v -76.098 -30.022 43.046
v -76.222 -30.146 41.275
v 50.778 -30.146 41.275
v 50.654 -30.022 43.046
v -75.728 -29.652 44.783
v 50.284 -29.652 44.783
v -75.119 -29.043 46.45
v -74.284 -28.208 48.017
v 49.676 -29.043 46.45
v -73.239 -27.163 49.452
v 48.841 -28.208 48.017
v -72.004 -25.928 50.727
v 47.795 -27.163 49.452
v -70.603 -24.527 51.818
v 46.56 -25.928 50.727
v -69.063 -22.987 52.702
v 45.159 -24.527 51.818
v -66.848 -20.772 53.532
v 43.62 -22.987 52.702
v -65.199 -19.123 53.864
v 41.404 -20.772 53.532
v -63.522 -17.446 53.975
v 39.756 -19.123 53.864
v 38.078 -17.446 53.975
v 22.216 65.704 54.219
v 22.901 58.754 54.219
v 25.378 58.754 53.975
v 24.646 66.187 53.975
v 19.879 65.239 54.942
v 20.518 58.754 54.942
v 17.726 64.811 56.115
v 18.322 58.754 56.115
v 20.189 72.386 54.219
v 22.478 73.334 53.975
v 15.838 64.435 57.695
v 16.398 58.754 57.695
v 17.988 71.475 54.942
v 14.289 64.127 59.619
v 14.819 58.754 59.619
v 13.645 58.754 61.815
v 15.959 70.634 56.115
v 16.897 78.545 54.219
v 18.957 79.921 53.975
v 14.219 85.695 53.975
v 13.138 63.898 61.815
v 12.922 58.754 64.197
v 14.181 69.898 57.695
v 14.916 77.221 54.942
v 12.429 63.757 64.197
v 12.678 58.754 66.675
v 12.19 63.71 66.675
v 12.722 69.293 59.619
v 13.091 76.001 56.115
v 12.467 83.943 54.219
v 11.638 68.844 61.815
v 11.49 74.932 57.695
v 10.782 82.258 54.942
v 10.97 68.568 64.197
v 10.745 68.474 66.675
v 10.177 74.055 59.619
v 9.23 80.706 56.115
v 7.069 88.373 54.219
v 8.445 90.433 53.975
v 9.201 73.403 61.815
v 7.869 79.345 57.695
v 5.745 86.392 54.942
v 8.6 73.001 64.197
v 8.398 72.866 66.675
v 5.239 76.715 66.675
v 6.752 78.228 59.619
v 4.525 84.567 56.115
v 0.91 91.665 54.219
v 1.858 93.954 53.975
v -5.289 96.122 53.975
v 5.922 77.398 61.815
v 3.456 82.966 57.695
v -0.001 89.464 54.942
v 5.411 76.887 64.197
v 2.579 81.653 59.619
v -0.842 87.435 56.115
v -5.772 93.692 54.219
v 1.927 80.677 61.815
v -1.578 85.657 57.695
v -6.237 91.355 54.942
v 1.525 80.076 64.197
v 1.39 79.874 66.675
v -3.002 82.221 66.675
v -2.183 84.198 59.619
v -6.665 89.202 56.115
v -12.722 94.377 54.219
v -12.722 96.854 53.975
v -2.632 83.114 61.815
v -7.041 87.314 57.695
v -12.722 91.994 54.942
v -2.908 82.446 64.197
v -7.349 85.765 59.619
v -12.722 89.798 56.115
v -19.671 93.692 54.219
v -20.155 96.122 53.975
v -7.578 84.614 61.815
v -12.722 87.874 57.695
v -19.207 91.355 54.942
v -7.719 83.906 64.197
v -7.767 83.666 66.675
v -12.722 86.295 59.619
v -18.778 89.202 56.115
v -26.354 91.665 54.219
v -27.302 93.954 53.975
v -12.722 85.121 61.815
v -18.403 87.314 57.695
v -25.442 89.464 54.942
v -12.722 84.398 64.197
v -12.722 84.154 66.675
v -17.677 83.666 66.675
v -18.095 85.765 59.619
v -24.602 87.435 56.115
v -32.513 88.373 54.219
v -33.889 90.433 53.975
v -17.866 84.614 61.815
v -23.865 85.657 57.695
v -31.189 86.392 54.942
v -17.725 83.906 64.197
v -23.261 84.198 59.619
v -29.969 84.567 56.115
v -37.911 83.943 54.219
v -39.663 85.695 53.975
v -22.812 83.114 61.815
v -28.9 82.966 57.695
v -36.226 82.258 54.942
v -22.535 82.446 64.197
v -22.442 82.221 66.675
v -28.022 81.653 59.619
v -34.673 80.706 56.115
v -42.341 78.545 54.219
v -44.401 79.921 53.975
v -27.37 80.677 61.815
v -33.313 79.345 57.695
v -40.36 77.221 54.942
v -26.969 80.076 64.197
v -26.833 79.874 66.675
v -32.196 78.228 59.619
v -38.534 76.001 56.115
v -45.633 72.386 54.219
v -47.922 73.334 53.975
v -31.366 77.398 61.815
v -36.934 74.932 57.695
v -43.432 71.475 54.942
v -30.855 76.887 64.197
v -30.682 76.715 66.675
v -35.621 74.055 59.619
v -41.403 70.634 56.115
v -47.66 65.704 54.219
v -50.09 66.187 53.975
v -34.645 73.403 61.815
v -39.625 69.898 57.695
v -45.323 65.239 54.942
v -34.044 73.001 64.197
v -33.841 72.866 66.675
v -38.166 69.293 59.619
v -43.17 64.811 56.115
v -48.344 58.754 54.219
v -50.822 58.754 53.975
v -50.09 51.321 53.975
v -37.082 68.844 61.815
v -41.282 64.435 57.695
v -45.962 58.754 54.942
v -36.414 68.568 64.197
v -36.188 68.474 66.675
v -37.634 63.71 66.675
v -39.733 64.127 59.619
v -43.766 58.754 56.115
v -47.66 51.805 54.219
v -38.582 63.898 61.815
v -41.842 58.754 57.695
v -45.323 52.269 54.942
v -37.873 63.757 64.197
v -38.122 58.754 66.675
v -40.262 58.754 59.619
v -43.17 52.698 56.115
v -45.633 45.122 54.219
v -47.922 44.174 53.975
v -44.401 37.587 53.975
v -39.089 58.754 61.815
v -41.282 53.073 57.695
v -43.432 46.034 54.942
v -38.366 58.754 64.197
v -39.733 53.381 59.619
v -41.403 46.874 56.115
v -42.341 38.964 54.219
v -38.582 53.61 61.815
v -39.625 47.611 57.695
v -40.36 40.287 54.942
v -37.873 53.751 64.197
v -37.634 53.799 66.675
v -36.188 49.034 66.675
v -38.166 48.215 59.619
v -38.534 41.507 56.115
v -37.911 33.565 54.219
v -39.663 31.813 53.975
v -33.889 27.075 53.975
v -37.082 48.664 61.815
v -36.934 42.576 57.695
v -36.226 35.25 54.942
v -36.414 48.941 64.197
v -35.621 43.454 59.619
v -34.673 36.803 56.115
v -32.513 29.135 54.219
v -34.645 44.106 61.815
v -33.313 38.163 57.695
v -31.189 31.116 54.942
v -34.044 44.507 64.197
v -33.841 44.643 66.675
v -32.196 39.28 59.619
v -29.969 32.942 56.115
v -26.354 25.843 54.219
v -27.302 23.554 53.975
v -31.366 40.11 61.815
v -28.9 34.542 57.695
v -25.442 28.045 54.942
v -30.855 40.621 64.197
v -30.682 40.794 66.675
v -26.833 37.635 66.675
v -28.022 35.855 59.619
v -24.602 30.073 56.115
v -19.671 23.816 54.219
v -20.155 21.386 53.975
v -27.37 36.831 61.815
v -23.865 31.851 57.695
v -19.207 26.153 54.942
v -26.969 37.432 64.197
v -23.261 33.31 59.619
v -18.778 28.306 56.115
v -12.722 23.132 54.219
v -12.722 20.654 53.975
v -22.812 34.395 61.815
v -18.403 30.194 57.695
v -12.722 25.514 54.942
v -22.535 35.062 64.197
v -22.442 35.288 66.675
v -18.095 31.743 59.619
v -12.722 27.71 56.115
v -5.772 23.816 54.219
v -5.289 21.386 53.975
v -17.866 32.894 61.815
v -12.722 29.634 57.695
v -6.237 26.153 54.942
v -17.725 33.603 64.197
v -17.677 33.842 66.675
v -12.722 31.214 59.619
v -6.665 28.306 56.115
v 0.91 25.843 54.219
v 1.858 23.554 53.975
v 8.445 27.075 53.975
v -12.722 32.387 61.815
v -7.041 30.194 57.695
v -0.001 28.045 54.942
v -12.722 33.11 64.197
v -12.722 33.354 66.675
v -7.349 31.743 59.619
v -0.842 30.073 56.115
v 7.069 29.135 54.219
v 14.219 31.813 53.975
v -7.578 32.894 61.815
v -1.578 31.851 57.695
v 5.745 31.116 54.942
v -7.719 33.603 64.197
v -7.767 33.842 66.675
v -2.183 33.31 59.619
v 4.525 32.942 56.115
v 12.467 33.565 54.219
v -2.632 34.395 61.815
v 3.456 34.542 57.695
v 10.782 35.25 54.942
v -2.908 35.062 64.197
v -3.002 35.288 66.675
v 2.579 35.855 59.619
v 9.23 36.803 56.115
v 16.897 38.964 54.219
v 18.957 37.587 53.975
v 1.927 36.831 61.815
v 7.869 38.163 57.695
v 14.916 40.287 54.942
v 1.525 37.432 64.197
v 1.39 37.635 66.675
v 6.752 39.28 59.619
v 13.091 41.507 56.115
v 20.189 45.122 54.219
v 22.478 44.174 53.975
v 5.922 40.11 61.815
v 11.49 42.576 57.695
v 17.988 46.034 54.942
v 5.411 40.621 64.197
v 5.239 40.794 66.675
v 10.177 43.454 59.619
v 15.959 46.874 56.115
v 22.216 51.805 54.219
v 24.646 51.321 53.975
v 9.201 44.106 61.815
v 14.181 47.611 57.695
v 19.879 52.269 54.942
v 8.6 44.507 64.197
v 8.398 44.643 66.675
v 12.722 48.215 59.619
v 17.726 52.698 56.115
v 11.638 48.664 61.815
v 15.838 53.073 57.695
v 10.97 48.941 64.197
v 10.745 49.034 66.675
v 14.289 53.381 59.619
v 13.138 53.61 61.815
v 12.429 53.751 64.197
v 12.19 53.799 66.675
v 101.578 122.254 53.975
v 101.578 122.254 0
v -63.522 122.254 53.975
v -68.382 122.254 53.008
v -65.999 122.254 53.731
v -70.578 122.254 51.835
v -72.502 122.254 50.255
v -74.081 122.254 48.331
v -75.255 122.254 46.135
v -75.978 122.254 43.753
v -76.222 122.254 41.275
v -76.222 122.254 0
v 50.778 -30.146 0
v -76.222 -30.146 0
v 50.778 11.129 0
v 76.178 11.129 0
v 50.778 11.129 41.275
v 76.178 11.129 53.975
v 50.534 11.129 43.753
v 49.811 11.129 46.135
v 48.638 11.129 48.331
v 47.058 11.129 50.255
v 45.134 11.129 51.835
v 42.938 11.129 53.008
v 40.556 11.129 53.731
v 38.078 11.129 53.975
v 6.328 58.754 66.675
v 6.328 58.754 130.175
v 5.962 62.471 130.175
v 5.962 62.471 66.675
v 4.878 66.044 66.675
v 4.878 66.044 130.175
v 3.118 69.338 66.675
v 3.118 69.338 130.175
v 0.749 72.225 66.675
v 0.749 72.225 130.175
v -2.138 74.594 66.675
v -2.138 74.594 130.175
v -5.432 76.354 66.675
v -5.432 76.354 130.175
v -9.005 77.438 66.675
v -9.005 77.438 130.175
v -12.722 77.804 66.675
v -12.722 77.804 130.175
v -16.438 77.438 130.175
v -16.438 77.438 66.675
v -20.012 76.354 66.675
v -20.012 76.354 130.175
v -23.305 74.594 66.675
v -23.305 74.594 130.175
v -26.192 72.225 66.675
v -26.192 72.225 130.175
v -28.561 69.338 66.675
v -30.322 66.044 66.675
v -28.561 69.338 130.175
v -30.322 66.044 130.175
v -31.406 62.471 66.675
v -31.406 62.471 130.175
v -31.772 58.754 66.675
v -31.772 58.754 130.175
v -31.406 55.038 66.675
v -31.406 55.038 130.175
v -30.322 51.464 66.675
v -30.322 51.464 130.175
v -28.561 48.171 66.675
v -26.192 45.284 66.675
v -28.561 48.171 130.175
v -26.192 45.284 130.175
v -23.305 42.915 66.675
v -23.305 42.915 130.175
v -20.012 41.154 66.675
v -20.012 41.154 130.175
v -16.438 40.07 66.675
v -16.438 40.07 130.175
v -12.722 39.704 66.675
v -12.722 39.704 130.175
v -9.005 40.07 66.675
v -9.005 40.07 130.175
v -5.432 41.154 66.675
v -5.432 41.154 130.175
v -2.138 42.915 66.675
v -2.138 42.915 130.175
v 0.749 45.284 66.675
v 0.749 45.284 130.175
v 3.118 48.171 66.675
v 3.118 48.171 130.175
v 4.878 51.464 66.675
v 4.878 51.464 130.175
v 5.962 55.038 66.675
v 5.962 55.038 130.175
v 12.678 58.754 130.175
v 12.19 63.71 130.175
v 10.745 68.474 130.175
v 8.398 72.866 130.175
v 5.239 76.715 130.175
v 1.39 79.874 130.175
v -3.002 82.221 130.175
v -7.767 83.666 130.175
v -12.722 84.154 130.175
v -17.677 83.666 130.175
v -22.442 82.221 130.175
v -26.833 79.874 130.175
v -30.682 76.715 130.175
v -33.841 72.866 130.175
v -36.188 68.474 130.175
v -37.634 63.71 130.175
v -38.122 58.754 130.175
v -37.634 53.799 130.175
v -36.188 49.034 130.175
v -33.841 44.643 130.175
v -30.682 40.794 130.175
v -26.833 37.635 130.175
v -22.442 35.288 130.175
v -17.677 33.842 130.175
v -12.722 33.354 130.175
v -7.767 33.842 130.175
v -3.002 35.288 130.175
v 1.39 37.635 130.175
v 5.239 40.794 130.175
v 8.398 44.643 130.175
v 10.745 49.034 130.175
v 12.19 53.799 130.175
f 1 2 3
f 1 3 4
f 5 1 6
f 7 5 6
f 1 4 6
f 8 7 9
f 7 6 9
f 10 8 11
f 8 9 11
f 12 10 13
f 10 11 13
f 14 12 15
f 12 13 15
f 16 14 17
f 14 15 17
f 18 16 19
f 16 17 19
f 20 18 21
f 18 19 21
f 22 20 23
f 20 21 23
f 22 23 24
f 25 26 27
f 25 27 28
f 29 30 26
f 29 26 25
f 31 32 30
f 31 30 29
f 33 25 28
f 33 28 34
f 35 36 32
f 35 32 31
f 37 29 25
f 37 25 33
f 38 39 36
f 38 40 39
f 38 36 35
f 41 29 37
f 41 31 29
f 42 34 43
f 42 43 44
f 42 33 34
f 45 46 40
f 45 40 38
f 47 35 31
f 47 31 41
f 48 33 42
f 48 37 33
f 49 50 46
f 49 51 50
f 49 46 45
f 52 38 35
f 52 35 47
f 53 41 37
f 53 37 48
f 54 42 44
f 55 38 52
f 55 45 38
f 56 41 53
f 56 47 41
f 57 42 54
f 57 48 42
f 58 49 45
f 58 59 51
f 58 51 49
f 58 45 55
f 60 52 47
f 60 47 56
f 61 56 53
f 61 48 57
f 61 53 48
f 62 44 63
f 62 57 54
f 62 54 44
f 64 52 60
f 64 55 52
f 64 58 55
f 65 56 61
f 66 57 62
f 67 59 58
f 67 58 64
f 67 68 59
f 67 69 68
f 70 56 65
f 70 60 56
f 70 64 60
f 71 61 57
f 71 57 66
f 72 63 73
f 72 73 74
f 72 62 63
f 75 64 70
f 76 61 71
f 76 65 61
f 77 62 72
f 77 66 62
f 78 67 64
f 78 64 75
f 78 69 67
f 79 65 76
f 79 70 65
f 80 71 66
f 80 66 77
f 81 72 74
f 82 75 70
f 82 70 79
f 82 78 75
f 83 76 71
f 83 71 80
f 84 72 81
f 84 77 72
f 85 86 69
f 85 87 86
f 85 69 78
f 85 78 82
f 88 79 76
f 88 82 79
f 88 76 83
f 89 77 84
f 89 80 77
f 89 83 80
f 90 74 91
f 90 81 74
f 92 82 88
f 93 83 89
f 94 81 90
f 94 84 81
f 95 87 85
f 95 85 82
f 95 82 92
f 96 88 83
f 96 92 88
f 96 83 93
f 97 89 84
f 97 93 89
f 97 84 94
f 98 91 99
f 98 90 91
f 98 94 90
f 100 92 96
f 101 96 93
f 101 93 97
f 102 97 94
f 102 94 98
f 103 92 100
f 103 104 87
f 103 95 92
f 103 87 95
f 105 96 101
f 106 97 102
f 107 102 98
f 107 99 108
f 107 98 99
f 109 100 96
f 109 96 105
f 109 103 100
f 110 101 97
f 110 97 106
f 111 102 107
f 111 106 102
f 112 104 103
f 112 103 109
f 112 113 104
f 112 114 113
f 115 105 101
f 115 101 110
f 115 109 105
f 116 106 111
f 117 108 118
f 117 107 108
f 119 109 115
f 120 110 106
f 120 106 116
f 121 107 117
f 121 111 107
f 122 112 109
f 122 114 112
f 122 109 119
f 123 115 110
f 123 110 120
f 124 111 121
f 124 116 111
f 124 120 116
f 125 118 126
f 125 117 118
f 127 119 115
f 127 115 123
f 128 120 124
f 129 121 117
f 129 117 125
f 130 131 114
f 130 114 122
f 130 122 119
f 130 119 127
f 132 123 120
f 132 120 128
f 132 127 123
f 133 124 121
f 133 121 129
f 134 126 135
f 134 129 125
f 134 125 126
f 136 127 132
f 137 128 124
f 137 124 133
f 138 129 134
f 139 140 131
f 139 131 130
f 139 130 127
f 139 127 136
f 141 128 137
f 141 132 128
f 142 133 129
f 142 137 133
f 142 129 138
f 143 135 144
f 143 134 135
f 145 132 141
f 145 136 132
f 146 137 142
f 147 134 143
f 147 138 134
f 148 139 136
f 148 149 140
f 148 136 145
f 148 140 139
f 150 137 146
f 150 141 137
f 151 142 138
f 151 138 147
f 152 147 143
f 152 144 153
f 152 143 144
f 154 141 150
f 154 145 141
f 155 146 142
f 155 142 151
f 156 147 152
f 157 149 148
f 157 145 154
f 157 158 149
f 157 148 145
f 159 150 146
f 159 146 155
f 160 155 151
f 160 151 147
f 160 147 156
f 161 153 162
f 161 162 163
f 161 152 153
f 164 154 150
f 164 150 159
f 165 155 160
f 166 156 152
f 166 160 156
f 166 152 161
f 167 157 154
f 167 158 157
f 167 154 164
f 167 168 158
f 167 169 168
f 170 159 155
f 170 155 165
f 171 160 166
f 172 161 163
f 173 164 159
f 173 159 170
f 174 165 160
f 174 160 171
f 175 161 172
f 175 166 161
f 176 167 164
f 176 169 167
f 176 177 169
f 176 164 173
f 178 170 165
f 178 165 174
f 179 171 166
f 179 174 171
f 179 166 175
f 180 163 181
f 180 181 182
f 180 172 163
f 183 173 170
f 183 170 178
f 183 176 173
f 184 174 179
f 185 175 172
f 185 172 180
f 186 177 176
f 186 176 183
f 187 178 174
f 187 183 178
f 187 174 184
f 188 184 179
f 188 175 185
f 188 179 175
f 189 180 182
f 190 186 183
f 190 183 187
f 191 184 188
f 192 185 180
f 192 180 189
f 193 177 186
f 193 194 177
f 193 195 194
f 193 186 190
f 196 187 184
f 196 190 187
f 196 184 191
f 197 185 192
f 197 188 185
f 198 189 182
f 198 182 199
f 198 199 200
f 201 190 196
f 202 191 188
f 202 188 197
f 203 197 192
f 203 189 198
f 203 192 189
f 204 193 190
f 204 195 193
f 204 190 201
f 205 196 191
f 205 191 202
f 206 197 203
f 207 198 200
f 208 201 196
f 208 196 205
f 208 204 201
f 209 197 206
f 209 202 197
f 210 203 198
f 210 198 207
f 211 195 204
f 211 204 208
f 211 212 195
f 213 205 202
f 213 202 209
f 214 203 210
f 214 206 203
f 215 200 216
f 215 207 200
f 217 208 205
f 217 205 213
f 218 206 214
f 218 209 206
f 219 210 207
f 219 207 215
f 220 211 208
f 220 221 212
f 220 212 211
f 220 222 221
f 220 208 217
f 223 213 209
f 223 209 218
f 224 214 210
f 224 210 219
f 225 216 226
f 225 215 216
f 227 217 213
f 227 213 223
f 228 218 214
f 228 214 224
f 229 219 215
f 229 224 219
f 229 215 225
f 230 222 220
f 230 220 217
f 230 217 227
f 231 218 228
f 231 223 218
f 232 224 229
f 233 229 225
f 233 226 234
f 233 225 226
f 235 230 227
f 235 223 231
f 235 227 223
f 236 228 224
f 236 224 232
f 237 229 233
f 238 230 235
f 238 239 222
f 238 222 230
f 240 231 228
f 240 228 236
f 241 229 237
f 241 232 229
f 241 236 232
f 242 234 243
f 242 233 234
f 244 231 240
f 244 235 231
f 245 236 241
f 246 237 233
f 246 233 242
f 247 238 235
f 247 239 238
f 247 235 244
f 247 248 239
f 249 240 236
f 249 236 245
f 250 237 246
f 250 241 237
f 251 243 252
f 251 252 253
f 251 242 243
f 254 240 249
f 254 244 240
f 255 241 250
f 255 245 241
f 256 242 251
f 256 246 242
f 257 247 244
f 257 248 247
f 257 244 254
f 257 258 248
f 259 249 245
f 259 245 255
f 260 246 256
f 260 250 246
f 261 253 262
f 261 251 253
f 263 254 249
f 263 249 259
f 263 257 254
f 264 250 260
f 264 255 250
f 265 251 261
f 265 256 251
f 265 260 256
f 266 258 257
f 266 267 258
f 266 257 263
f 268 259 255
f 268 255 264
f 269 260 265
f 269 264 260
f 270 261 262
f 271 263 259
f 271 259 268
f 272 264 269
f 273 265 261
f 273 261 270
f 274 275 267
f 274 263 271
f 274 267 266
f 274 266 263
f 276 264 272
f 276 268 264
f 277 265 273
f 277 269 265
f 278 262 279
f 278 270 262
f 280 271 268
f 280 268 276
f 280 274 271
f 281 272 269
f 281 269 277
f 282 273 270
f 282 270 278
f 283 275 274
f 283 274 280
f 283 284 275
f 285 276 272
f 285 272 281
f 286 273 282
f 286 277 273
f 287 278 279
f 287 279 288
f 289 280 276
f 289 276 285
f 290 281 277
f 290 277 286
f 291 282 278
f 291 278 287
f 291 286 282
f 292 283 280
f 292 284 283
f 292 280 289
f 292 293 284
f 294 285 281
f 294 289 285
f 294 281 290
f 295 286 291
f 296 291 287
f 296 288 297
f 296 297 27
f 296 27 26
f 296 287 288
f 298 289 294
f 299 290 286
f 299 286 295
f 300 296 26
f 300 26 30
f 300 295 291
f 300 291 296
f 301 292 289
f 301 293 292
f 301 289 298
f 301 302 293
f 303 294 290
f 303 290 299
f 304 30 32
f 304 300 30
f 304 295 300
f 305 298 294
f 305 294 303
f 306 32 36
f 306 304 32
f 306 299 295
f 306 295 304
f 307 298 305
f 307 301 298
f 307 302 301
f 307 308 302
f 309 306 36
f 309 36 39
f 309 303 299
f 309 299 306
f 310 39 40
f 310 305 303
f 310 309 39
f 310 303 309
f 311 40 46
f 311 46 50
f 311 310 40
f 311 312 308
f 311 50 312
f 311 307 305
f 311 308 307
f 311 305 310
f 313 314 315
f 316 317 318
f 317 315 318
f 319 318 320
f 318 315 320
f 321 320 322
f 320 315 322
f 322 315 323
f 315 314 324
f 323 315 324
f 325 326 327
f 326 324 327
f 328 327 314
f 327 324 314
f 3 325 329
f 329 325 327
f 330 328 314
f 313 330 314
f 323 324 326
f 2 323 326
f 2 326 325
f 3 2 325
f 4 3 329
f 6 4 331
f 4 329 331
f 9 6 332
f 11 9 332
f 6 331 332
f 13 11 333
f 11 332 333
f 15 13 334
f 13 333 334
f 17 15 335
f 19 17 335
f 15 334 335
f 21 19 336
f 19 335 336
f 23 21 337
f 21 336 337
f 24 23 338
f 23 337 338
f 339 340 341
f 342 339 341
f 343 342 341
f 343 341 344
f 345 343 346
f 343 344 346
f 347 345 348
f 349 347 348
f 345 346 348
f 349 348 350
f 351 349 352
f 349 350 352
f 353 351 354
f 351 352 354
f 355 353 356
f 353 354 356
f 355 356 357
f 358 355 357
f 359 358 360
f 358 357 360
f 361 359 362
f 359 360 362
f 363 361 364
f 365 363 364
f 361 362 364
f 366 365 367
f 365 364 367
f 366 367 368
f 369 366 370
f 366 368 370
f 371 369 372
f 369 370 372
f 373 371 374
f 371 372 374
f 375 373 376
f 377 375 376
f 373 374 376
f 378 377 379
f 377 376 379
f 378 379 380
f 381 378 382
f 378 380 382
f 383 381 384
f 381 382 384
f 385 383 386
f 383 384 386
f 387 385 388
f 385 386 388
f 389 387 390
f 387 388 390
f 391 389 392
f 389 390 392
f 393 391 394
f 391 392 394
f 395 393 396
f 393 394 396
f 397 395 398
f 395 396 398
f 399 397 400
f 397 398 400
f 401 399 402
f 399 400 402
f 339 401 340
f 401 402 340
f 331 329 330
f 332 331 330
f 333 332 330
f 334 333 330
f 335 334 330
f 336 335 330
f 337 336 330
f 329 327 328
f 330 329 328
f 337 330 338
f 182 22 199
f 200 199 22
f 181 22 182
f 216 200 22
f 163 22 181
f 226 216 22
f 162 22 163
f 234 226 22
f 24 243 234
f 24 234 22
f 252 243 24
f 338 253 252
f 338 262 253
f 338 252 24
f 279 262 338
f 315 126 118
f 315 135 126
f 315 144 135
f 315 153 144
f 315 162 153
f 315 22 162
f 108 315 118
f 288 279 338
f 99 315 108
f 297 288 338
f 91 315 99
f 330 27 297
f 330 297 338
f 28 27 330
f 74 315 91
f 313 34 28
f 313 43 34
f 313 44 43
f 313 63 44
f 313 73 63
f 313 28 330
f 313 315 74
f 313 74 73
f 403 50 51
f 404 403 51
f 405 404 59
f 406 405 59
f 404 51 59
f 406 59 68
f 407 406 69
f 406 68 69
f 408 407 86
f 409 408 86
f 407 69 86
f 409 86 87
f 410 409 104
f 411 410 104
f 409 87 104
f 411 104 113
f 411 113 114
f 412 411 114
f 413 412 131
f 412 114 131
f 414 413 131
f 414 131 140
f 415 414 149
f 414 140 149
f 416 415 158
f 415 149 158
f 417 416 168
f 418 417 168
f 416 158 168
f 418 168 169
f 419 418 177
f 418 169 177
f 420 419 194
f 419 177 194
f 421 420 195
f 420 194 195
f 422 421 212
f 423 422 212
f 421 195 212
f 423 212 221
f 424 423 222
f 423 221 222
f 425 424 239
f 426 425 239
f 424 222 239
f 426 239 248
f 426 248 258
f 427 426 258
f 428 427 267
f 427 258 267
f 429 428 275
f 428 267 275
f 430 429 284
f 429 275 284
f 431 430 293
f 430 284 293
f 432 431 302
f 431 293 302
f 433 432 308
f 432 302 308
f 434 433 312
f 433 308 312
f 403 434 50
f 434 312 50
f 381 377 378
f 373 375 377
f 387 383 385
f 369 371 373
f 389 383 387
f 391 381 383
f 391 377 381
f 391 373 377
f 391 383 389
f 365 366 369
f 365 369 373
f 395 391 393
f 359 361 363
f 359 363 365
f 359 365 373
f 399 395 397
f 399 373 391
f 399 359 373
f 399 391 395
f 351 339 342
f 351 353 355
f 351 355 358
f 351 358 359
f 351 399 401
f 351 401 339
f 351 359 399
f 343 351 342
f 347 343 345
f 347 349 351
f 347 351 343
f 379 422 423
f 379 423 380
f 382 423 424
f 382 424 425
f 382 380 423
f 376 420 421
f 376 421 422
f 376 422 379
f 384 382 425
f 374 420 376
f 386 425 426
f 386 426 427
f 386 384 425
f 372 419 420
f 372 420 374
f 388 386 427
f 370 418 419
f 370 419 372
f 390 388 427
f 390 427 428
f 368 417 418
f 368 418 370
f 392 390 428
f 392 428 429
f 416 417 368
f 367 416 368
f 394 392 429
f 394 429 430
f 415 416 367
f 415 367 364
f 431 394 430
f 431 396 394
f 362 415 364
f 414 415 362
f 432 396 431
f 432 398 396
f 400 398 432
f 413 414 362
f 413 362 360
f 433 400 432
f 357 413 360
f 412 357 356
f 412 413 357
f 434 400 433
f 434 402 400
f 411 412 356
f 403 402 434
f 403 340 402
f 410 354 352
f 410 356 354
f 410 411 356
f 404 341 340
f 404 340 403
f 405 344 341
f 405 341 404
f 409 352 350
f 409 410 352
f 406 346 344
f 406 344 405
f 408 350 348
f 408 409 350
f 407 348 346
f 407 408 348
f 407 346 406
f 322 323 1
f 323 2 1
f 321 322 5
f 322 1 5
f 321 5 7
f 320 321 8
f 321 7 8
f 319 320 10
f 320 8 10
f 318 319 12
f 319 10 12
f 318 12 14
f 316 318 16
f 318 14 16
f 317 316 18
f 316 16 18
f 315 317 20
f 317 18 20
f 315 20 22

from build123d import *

# Parameters (mm, degrees)
F1_DEPTH = 53.975
F3_R     = 25.4
F4_DEPTH = 76.2
F5_R     = 19.05
F6_DEPTH = 63.5
F7_R     = 12.7


with BuildPart() as f1:
    # F0 (on Top) → F1 (new body)
    with BuildSketch(Plane.XY):
        Polygon((-76.22182, -30.145772), (50.77818, -30.145772), (50.77818, 11.129228), (76.17818, 11.129228), (101.57818, 122.254228), (-76.22182, 122.254228), align=None)
    extrude(amount=F1_DEPTH)

    # F3 (on face) → F4 (join)
    with BuildSketch(Plane.XY.offset(53.975)):
        with Locations((-12.72182, 58.754228)):
            Circle(F3_R)
    extrude(amount=F4_DEPTH)

    # F5 (on face) → F6 (cut)
    with BuildSketch(Plane.XY.offset(130.175)):
        with Locations((-12.72182, 58.754228)):
            Circle(F5_R)
    extrude(amount=-F6_DEPTH, mode=Mode.SUBTRACT)

    # F7
    f7_edges = [f1.edges().sort_by_distance(p)[0] for p in [
        (-12.72182, -30.145772, 53.975),
        (50.77818, -9.508272, 53.975),
        (-76.22182, 46.054228, 53.975),
        (-38.12182, 58.754228, 53.975),
    ]]
    fillet(f7_edges, radius=F7_R)


solid = f1.part
